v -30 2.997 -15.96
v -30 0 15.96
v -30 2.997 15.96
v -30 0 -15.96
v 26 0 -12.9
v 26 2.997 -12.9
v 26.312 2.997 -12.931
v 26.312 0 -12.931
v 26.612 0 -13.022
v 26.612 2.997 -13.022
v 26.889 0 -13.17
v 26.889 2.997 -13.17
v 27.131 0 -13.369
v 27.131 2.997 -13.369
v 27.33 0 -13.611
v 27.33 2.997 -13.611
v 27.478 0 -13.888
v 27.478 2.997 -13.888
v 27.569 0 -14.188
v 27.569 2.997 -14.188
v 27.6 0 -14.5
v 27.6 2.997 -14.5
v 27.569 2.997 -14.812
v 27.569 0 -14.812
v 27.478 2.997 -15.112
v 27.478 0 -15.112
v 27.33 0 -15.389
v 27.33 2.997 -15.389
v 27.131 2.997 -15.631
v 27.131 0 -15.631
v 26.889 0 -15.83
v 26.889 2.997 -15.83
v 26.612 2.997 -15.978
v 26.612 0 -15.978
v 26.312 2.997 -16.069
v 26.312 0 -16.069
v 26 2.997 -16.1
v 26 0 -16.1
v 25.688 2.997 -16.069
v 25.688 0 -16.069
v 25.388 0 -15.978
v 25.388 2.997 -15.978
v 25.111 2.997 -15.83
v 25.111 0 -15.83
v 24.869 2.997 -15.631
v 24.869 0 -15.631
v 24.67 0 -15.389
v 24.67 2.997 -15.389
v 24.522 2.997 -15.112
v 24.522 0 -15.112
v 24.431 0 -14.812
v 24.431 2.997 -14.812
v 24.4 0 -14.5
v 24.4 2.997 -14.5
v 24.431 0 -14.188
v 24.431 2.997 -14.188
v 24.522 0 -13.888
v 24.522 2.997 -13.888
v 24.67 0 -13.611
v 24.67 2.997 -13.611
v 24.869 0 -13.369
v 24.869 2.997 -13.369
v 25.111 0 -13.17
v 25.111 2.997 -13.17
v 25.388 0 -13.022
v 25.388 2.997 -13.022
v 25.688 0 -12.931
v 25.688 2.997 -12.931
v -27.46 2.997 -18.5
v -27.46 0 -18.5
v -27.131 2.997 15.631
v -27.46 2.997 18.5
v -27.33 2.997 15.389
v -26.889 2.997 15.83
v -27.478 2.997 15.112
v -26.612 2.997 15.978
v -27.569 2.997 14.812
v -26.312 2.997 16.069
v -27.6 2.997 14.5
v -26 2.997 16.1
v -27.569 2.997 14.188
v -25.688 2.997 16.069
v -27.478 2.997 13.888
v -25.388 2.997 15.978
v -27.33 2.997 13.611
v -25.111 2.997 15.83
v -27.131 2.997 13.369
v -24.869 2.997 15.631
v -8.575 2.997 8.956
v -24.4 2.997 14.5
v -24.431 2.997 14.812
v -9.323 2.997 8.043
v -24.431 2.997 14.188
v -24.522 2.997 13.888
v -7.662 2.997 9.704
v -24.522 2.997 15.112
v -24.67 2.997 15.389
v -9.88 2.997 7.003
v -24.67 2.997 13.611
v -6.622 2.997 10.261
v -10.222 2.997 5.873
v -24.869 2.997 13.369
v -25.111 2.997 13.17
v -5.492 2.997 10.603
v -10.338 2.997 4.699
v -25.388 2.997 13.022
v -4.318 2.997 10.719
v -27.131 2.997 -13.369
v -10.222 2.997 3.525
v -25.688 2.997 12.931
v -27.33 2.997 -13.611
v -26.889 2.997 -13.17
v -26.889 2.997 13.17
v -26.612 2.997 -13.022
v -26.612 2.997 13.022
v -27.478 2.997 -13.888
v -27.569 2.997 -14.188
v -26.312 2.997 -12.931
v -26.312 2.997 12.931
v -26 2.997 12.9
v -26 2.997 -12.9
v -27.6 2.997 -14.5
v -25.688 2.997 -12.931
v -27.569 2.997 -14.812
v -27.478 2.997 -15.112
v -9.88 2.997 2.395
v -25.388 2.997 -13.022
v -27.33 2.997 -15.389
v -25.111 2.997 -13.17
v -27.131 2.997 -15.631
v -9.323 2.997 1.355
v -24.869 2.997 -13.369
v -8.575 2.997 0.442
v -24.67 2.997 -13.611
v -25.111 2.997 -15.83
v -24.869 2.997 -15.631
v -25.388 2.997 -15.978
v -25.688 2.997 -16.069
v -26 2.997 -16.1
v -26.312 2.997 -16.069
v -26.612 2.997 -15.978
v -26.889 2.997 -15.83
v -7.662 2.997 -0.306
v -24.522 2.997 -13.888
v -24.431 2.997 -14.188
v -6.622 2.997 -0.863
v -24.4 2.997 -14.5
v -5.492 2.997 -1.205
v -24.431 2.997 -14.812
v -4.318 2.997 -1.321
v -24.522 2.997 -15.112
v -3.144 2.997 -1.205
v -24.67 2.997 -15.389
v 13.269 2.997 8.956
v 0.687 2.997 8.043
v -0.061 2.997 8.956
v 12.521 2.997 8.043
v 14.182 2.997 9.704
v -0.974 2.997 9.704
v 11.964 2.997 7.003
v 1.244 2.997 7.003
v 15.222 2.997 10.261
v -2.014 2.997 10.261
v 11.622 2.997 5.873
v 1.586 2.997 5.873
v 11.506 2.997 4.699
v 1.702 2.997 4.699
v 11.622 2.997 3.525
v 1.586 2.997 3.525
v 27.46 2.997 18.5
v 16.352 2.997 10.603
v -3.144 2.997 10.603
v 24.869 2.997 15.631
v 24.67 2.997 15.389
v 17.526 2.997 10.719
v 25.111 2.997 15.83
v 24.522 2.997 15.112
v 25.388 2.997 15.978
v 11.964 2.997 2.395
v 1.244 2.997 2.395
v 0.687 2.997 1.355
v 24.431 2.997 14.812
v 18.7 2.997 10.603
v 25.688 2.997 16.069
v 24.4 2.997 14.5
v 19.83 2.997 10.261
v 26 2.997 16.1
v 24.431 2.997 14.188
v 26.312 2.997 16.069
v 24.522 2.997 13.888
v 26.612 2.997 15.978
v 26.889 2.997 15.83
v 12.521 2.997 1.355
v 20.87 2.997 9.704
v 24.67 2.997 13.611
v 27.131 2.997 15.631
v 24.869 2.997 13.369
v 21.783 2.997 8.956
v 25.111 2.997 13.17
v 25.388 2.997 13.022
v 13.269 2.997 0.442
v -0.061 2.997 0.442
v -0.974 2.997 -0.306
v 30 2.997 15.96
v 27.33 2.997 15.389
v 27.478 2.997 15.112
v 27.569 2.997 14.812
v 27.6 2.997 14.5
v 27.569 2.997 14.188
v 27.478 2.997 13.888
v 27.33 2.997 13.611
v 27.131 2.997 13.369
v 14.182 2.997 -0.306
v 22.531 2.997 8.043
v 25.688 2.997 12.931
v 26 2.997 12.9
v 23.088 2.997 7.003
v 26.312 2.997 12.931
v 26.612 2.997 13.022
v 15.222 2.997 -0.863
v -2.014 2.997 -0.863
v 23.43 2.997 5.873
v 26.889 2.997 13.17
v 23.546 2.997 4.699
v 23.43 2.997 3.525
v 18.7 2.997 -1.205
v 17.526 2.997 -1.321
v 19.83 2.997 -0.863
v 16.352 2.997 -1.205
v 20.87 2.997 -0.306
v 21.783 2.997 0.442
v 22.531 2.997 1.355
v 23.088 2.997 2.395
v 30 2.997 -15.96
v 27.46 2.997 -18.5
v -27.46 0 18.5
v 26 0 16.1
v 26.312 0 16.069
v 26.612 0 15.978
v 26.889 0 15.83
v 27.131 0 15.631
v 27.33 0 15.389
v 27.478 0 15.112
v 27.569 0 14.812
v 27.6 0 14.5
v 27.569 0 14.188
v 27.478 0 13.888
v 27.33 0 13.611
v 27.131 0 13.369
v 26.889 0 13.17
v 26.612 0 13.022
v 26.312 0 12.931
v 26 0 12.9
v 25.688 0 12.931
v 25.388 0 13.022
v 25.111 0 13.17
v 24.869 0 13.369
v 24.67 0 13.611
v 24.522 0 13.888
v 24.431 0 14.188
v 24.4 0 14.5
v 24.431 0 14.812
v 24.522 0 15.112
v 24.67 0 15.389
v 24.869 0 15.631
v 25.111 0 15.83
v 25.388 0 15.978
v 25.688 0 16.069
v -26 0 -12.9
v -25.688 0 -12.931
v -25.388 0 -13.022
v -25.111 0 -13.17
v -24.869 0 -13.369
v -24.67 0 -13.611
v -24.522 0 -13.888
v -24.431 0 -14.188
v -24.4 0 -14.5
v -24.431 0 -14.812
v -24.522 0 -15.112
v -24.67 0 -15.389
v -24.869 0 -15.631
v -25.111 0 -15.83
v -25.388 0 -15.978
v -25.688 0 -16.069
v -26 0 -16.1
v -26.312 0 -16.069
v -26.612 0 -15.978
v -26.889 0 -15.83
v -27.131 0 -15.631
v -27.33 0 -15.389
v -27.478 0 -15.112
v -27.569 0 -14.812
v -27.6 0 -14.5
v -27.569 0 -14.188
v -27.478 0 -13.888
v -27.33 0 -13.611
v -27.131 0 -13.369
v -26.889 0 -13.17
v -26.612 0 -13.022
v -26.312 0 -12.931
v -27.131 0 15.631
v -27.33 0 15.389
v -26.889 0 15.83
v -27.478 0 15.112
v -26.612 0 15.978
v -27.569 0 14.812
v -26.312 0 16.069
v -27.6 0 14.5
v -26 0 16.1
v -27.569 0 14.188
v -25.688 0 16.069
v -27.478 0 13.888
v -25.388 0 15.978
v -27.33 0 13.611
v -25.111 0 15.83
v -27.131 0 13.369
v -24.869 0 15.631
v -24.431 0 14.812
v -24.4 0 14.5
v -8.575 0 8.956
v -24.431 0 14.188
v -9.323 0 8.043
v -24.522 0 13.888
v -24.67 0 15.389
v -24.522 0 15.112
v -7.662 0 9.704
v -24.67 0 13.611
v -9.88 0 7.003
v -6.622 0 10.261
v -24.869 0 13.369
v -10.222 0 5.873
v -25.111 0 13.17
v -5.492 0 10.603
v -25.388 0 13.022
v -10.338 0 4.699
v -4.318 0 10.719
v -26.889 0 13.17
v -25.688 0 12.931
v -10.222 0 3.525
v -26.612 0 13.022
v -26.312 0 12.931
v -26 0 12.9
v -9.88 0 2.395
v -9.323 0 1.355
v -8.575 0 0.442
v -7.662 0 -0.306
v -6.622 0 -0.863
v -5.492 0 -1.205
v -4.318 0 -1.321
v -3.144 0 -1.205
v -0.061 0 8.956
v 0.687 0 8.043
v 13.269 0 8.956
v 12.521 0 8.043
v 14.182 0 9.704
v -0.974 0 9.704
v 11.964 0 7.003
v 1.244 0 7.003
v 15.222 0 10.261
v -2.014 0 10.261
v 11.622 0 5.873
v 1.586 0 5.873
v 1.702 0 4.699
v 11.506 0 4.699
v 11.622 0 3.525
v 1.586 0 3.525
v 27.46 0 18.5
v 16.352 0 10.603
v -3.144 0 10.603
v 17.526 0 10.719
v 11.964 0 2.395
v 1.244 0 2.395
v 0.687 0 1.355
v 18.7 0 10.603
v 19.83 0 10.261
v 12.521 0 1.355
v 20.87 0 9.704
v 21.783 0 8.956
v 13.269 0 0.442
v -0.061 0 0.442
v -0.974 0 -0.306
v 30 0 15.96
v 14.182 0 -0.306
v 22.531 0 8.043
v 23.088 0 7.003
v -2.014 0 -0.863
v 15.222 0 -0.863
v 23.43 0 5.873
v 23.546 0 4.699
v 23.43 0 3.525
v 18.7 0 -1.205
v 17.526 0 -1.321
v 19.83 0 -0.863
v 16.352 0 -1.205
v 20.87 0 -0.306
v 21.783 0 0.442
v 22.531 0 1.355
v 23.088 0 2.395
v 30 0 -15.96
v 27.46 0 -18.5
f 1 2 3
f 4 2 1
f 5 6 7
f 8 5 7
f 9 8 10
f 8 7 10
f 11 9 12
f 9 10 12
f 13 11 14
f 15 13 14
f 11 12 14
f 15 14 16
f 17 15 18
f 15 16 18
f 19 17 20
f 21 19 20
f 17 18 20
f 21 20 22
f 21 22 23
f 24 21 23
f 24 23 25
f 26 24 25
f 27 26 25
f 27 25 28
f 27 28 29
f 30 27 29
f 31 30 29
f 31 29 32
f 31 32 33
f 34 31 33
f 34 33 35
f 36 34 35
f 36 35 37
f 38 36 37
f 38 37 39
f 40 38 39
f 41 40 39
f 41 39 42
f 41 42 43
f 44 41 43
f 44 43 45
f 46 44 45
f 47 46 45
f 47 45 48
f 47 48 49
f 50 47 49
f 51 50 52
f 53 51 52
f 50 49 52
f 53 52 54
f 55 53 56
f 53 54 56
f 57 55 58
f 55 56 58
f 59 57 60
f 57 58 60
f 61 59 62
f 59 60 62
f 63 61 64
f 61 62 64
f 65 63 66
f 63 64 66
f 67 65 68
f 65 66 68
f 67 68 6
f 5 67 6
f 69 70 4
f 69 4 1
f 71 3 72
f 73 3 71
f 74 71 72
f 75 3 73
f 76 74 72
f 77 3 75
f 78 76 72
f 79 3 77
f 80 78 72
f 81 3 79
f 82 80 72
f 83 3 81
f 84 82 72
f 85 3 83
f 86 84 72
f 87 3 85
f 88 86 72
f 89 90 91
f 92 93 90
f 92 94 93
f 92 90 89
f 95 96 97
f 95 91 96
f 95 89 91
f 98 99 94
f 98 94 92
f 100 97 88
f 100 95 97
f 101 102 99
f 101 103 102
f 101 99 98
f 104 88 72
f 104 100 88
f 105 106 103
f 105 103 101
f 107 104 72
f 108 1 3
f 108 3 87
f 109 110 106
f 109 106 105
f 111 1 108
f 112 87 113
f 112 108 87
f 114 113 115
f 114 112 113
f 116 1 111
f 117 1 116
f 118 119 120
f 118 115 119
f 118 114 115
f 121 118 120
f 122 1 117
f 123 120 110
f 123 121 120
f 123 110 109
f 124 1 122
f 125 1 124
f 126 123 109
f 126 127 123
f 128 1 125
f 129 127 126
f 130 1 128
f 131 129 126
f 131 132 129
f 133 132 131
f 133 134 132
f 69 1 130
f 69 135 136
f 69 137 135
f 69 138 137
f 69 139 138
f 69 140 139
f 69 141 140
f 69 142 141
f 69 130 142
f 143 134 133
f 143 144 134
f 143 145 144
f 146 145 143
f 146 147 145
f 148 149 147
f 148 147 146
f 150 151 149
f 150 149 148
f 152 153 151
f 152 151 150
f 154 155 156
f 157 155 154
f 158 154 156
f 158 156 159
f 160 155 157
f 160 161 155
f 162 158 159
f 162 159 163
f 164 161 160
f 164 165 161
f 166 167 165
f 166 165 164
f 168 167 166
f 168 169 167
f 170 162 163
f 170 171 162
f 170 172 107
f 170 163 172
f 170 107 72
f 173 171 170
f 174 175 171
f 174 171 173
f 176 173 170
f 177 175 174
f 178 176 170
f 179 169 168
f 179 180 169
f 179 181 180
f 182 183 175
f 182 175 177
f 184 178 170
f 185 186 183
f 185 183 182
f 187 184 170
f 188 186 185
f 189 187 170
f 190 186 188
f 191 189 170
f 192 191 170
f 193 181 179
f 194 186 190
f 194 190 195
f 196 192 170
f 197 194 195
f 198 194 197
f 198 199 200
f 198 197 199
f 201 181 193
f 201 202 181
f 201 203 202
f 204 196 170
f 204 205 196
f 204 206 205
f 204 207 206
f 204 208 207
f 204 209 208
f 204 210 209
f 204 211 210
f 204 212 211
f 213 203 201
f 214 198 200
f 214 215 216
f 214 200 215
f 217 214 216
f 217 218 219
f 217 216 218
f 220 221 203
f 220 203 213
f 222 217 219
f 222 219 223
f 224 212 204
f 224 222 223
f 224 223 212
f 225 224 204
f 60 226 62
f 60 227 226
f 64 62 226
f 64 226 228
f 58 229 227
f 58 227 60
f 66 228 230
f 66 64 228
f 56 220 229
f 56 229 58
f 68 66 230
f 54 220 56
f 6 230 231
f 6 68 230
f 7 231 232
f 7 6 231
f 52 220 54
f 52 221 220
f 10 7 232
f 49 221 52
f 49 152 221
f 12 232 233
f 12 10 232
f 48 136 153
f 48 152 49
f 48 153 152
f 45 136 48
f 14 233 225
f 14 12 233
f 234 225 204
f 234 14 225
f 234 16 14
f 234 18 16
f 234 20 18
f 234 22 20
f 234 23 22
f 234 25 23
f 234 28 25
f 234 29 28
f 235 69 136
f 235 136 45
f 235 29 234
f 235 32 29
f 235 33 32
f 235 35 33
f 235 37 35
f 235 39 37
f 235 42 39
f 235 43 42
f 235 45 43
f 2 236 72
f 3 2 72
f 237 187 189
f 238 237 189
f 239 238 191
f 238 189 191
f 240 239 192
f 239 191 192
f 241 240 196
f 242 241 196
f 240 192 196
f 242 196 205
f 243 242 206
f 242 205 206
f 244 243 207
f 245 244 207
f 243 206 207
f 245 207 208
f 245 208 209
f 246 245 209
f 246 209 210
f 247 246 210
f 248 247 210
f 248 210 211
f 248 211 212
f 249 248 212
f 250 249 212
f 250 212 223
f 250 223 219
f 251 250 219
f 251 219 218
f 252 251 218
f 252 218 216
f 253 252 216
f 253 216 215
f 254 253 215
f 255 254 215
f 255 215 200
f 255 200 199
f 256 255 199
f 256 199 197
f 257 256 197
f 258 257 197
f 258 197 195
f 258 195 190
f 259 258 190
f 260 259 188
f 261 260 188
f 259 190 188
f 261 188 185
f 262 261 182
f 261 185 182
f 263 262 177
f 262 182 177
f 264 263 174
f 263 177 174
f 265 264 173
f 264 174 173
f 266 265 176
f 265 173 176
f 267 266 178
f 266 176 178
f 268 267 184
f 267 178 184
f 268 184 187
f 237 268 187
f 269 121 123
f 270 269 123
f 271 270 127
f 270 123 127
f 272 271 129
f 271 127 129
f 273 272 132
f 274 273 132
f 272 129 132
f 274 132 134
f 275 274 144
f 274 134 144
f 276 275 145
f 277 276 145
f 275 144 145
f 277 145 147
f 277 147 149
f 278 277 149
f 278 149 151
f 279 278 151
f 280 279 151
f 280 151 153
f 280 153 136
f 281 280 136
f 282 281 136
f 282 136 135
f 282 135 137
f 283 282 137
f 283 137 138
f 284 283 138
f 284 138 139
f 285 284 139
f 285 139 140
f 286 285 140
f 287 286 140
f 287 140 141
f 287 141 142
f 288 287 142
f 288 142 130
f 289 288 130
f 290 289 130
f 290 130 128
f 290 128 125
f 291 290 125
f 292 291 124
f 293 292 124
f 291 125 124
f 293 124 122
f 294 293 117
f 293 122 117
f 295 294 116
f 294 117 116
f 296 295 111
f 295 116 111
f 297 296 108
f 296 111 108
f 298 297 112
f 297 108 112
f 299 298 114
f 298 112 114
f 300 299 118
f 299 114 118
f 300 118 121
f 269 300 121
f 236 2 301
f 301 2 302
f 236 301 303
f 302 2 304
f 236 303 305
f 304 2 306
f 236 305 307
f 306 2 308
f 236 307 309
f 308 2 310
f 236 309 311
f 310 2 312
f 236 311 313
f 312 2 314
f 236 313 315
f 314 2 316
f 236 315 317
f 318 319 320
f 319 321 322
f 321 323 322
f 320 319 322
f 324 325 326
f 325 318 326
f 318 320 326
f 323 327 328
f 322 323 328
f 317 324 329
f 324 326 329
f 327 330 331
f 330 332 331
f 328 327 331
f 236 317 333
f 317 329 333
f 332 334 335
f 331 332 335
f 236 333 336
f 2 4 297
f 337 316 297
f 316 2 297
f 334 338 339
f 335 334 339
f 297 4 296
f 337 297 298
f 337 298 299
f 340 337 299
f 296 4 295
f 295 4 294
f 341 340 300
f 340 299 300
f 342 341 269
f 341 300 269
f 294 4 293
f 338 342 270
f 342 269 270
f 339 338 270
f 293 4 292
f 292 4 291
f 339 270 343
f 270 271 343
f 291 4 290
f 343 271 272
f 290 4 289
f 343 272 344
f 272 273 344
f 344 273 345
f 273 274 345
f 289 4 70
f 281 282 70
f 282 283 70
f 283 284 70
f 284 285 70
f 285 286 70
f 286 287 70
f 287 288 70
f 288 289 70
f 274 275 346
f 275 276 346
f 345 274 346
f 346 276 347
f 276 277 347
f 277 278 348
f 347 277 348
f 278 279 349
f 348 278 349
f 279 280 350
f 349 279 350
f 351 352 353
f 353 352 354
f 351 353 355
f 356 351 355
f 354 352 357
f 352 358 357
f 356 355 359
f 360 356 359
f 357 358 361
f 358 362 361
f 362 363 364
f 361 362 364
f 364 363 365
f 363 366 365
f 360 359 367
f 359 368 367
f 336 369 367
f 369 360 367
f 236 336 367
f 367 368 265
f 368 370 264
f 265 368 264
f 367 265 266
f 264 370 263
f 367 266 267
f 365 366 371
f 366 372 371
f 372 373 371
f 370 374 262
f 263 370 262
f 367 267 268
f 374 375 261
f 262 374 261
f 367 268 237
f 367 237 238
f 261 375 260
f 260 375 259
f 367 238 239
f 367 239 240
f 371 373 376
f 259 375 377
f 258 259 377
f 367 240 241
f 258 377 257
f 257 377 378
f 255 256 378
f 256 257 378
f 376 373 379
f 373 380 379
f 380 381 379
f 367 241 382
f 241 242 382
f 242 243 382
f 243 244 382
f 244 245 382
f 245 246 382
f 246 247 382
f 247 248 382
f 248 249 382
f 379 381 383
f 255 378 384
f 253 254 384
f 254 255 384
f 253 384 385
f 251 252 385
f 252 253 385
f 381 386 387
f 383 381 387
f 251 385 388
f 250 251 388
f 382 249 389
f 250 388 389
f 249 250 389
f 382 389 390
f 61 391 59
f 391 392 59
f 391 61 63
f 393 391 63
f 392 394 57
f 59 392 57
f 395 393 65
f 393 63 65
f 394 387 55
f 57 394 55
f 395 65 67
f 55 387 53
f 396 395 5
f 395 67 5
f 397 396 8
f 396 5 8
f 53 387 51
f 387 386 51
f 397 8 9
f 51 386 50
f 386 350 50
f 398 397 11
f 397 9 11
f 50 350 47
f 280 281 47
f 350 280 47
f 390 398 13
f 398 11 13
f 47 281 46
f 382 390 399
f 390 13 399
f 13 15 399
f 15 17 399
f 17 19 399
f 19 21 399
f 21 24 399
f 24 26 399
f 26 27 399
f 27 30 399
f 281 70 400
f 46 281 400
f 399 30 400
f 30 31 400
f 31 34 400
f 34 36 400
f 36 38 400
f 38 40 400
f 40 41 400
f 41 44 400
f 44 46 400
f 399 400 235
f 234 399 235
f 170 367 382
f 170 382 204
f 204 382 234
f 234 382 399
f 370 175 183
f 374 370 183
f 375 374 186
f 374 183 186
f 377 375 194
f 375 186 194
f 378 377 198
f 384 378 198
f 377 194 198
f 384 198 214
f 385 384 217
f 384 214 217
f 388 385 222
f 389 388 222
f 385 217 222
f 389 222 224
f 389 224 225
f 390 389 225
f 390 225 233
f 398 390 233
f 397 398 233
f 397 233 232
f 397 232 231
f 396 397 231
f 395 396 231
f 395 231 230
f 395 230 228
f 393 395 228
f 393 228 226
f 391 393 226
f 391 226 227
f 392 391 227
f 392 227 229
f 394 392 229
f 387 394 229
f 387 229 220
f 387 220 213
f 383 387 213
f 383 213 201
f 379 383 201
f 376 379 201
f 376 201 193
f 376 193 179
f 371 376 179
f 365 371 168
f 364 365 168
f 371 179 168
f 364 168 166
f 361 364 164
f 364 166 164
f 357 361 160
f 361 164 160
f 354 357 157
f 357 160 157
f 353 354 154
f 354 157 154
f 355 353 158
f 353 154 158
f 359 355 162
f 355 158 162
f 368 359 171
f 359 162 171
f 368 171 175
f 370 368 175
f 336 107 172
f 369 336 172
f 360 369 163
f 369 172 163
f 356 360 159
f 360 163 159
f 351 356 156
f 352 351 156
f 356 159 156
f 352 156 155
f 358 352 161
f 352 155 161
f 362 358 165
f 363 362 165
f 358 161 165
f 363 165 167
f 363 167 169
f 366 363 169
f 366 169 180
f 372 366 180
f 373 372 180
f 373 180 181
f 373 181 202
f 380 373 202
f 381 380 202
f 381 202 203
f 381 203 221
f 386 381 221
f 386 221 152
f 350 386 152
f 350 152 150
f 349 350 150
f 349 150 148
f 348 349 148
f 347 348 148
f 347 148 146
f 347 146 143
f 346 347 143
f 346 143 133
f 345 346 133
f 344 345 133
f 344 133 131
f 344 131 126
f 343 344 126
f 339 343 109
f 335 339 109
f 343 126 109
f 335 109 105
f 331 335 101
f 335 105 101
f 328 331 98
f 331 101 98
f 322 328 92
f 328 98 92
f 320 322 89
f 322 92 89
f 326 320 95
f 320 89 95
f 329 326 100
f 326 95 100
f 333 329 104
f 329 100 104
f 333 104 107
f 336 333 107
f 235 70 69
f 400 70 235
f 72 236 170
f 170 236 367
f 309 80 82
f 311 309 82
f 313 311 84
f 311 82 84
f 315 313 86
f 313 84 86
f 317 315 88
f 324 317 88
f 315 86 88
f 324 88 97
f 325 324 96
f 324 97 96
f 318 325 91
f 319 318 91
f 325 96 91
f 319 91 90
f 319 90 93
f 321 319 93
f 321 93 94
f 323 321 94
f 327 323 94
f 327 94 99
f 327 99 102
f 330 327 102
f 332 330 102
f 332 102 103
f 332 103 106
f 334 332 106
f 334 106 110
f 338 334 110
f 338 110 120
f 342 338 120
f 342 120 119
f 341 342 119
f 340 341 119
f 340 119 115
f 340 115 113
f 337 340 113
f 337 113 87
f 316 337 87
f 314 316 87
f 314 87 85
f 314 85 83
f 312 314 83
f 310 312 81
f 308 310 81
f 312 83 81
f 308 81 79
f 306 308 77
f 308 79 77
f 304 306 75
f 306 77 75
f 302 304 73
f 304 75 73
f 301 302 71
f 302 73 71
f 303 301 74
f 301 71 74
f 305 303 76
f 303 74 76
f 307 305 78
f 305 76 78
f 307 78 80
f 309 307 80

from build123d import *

# Parameters (mm, degrees)
SKETCH1_W           = 60
SKETCH1_H           = 37
BOSS_EXTRUDE1_DEPTH = 2.9972
SKETCH2_R           = 1.6
CUT_EXTRUDE1_DEPTH  = 36.372774952
SKETCH3_R           = 6.0198
CUT_EXTRUDE2_DEPTH  = 36.372774952
CHAMFER1_SIZE       = 2.54


with BuildPart() as part:
    # Sketch1 → Boss-Extrude1 (new body)
    with BuildSketch(Plane(origin=(0, 0, 0), x_dir=(1, 0, 0), z_dir=(0, 1, 0))):
        Rectangle(SKETCH1_W, SKETCH1_H)
    extrude(amount=BOSS_EXTRUDE1_DEPTH)

    # Sketch2 → Cut-Extrude1 (cut, through all)
    with BuildSketch(Plane(origin=(0, 2.9972, 0), x_dir=(1, 0, 0), z_dir=(0, 1, 0))):
        with Locations(Location((-26, 14.5, 0), (0, 0, 270))):
            Circle(SKETCH2_R)
        with Locations(Location((-26, -14.5, 0), (0, 0, 270))):
            Circle(SKETCH2_R)
        with Locations(Location((26, -14.5, 0), (0, 0, 270))):
            Circle(SKETCH2_R)
        with Locations(Location((26, 14.5, 0), (0, 0, 270))):
            Circle(SKETCH2_R)
    extrude(amount=-CUT_EXTRUDE1_DEPTH, mode=Mode.SUBTRACT)

    # Sketch3 → Cut-Extrude2 (cut, through all)
    with BuildSketch(Plane(origin=(0, 2.9972, 0), x_dir=(1, 0, 0), z_dir=(0, 1, 0))):
        with Locations(Location((-4.318, -4.699, 0), (0, 0, 270))):
            Circle(SKETCH3_R)
        with Locations(Location((17.526, -4.699, 0), (0, 0, 270))):
            Circle(SKETCH3_R)
    extrude(amount=-CUT_EXTRUDE2_DEPTH, mode=Mode.SUBTRACT)

    # Chamfer1
    chamfer1_edges = [part.edges().sort_by_distance(p)[0] for p in [
        (30, 1.4986, 18.5),
        (-30, 1.4986, 18.5),
        (-30, 1.4986, -18.5),
        (30, 1.4986, -18.5),
    ]]
    chamfer(chamfer1_edges, length=CHAMFER1_SIZE)


solid = part.part
